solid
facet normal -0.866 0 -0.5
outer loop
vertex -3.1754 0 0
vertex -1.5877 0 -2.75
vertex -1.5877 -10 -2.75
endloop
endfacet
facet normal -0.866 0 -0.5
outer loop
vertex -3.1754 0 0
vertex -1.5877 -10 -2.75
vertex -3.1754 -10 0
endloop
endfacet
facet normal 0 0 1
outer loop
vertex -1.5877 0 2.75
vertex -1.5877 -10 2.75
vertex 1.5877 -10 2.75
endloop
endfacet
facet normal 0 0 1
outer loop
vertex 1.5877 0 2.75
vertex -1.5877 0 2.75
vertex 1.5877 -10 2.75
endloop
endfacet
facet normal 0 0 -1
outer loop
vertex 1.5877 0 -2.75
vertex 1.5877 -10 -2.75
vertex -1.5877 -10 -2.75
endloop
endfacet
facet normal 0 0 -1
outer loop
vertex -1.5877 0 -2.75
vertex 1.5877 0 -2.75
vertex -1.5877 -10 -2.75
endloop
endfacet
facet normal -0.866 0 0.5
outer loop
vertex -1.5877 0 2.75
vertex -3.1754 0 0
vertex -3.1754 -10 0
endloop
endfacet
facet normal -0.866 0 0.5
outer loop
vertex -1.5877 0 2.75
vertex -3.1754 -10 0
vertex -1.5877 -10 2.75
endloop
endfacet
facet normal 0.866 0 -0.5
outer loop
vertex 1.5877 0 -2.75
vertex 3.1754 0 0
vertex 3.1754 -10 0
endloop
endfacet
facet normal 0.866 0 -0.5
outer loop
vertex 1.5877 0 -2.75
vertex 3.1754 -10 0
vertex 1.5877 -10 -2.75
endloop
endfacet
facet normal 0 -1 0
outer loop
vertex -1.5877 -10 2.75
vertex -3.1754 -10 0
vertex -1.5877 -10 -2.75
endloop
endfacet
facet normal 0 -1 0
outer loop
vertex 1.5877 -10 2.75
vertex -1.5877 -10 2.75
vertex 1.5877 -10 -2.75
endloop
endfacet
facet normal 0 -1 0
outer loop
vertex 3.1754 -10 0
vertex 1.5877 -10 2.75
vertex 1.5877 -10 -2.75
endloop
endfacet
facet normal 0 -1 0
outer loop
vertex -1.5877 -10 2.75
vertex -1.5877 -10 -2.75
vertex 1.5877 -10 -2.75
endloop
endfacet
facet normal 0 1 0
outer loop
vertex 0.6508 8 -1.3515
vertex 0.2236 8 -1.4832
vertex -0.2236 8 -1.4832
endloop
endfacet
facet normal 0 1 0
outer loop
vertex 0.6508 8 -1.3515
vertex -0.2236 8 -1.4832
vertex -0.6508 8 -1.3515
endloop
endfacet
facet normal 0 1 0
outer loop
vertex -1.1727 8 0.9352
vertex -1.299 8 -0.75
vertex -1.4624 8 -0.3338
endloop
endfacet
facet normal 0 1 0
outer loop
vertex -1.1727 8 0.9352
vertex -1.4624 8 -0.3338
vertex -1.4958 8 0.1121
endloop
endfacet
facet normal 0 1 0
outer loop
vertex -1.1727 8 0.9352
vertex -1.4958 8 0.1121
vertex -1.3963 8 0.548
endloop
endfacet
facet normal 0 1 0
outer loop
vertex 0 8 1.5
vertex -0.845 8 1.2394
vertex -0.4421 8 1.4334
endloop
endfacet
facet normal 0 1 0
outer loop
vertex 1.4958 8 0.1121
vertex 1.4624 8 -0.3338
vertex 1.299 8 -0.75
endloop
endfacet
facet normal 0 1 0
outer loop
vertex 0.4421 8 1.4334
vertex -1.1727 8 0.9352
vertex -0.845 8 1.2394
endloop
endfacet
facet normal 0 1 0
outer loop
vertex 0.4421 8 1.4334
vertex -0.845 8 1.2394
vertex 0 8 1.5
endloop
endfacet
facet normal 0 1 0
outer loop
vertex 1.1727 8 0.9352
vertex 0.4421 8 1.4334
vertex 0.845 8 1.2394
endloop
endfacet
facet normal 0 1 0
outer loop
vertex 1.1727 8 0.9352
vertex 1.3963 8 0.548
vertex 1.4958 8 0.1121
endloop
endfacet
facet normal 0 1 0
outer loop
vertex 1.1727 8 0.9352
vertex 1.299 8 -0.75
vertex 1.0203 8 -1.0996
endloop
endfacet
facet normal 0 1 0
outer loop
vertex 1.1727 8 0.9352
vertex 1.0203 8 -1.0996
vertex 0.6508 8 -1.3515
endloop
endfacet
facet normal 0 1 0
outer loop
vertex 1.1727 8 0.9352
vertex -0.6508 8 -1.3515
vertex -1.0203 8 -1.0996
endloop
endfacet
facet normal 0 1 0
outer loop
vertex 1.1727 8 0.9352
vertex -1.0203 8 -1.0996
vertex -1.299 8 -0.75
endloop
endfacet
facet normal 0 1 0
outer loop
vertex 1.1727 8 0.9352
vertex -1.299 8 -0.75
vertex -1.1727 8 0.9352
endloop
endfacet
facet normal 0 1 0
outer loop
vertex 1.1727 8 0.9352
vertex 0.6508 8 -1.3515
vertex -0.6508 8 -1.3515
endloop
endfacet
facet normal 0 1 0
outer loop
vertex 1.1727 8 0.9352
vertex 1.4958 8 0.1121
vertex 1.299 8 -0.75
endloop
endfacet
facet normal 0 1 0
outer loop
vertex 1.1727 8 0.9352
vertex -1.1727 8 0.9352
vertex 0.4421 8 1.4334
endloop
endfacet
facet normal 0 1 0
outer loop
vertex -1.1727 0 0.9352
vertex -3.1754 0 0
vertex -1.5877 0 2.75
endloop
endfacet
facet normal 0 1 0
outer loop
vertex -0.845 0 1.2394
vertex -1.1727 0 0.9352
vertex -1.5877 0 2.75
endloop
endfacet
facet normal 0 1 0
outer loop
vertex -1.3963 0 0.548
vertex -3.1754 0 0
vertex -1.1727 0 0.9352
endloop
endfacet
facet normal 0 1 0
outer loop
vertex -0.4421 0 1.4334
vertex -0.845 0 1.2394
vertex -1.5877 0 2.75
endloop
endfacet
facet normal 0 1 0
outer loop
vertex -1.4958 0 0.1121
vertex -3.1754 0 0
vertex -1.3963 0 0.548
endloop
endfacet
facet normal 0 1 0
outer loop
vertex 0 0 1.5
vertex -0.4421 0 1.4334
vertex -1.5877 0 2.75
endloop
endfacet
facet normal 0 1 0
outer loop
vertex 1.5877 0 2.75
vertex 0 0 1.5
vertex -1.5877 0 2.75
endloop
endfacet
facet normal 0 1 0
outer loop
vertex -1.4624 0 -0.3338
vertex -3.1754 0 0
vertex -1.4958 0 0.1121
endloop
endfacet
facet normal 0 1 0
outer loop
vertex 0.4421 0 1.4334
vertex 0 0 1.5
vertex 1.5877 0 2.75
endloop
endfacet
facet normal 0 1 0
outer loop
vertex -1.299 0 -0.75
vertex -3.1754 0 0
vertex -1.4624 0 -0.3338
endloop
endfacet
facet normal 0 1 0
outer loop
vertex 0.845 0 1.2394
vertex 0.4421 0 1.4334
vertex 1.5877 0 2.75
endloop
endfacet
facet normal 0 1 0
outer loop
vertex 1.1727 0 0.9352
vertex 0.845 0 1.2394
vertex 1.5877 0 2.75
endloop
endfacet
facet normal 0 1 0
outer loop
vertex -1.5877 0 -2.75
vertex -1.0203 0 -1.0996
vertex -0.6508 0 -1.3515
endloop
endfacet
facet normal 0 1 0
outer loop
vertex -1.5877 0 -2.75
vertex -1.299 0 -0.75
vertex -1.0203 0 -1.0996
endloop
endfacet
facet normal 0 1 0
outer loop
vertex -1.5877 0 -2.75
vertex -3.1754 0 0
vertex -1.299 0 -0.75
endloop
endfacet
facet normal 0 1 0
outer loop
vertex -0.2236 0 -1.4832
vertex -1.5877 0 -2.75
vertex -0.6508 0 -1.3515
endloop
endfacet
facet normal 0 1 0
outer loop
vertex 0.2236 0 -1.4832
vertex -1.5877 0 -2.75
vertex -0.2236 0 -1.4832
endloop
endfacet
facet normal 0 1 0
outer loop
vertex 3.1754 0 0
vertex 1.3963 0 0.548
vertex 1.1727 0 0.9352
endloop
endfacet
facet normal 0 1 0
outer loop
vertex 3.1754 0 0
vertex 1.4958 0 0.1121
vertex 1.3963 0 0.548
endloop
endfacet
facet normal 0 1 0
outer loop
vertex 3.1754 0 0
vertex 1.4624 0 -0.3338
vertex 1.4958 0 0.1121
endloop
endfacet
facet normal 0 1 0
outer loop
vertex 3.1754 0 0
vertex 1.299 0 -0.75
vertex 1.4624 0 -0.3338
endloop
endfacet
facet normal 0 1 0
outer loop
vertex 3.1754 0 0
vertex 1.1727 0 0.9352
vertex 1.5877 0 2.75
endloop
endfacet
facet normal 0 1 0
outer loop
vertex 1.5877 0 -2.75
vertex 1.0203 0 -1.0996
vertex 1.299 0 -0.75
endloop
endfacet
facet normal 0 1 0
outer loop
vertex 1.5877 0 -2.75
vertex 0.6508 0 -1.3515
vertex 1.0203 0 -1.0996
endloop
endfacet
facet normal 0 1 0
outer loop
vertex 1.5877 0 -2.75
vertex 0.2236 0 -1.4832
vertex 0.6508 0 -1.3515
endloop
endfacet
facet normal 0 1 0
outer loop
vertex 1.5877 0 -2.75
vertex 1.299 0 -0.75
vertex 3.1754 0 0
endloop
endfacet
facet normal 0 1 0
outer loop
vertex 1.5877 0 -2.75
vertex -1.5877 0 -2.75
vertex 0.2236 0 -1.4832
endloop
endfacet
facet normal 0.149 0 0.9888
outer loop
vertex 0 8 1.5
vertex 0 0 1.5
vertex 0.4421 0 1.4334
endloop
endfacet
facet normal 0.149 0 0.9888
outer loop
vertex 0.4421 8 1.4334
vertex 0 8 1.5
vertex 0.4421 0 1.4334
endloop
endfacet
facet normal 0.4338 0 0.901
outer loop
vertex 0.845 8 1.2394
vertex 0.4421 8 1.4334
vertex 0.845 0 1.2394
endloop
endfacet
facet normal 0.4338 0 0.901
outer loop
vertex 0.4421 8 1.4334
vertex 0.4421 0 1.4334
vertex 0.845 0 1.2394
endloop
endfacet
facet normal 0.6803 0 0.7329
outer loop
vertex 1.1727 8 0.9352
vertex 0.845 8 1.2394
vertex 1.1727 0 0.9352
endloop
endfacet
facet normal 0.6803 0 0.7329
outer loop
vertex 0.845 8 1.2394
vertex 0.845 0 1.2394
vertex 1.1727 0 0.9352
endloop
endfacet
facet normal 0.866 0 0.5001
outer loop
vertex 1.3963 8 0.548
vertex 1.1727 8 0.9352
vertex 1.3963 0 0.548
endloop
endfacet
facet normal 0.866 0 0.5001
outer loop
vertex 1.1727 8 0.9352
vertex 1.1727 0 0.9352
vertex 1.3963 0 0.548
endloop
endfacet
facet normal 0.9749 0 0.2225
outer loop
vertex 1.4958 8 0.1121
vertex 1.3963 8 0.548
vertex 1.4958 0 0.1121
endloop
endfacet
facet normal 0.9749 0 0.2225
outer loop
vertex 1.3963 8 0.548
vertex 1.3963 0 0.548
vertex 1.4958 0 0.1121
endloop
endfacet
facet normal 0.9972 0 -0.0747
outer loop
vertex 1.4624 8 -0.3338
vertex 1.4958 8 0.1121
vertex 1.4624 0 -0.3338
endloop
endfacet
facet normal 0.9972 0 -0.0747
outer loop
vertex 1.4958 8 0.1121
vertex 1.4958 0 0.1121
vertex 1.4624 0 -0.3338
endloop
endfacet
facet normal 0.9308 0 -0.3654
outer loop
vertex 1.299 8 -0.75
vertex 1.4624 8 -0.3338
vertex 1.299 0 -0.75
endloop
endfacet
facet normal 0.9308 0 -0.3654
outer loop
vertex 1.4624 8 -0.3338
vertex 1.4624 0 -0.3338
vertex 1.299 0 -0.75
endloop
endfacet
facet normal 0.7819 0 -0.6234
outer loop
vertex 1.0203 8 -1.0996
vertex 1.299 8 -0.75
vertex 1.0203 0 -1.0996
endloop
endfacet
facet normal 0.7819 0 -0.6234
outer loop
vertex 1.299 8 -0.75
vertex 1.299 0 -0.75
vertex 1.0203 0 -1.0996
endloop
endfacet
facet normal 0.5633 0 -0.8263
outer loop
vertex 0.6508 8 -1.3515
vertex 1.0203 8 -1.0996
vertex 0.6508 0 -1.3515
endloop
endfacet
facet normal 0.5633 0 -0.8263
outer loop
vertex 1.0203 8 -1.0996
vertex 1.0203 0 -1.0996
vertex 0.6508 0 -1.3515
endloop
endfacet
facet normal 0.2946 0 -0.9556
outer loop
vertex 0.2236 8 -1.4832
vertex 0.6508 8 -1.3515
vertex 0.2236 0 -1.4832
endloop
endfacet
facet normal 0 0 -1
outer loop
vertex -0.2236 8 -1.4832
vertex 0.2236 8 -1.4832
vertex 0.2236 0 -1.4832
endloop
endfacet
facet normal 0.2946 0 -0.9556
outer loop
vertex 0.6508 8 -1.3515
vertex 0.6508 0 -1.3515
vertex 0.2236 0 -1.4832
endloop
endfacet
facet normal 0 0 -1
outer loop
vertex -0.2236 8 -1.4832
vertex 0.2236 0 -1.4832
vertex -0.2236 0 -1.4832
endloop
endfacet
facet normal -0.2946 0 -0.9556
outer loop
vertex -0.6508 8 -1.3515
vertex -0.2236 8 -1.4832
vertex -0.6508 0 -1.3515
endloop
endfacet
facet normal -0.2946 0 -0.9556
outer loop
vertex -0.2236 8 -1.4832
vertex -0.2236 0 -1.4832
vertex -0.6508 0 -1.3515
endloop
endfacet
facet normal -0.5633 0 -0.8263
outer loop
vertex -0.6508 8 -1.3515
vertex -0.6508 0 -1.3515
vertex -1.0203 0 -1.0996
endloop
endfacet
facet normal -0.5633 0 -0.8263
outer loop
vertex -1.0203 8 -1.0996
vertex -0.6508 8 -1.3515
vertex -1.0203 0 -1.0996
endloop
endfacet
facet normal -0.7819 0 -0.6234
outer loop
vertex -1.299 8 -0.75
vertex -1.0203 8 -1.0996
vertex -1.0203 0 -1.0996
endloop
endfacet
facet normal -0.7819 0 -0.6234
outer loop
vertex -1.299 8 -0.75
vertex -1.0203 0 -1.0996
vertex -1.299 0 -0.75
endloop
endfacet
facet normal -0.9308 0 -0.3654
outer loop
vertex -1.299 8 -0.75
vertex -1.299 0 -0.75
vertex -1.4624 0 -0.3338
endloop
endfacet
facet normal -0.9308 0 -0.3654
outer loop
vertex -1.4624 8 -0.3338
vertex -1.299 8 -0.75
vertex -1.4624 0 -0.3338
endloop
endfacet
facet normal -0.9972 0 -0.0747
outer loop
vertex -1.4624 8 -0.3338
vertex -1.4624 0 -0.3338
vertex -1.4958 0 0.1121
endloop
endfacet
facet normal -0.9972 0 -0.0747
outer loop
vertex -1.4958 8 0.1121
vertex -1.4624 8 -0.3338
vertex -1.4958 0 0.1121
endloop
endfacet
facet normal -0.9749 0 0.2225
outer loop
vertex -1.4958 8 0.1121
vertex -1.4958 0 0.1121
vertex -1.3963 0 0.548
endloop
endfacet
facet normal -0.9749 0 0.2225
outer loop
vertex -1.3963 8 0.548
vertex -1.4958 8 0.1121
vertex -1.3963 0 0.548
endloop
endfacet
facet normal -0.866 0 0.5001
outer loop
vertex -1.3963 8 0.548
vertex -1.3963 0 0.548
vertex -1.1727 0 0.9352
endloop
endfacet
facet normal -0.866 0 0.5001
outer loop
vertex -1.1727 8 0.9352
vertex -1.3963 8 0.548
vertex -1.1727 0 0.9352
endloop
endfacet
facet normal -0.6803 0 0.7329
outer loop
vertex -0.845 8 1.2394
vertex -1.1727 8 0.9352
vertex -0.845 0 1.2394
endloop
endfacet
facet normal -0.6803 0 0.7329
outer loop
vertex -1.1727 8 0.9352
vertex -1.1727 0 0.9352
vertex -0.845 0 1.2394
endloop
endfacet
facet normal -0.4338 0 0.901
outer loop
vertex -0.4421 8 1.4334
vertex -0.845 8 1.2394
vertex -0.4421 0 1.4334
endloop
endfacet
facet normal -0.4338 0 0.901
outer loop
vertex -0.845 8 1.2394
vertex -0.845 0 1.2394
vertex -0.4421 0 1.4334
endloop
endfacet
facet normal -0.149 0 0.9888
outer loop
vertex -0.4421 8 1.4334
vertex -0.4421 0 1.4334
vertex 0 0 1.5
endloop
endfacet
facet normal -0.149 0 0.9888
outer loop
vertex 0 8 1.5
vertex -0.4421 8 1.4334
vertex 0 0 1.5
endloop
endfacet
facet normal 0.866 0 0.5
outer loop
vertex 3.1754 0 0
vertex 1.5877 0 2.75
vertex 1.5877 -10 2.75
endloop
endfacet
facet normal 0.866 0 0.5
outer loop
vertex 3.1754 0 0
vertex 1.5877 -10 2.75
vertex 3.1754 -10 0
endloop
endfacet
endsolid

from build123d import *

# Parameters (mm, degrees)
BOSS_EXTRUDE1_DEPTH = 10
SKETCH2_R           = 1.5
BOSS_EXTRUDE2_DEPTH = 8


with BuildPart() as part:
    # Sketch1 → Boss-Extrude1 (new body)
    with BuildSketch(Plane(origin=(0, 0, 0), x_dir=(1, 0, 0), z_dir=(0, 1, 0))):
        Polygon((3.175426481, 0), (1.58771324, 2.75), (-1.58771324, 2.75), (-3.175426481, 0), (-1.58771324, -2.75), (1.58771324, -2.75), align=None)
    extrude(amount=-BOSS_EXTRUDE1_DEPTH)

    # Sketch2 → Boss-Extrude2 (add)
    with BuildSketch(Plane(origin=(0, 0, 0), x_dir=(1, 0, 0), z_dir=(0, 1, 0))):
        with Locations(Location((0, 0, 0), (0, 0, 270))):
            Circle(SKETCH2_R)
    extrude(amount=BOSS_EXTRUDE2_DEPTH)


solid = part.part
